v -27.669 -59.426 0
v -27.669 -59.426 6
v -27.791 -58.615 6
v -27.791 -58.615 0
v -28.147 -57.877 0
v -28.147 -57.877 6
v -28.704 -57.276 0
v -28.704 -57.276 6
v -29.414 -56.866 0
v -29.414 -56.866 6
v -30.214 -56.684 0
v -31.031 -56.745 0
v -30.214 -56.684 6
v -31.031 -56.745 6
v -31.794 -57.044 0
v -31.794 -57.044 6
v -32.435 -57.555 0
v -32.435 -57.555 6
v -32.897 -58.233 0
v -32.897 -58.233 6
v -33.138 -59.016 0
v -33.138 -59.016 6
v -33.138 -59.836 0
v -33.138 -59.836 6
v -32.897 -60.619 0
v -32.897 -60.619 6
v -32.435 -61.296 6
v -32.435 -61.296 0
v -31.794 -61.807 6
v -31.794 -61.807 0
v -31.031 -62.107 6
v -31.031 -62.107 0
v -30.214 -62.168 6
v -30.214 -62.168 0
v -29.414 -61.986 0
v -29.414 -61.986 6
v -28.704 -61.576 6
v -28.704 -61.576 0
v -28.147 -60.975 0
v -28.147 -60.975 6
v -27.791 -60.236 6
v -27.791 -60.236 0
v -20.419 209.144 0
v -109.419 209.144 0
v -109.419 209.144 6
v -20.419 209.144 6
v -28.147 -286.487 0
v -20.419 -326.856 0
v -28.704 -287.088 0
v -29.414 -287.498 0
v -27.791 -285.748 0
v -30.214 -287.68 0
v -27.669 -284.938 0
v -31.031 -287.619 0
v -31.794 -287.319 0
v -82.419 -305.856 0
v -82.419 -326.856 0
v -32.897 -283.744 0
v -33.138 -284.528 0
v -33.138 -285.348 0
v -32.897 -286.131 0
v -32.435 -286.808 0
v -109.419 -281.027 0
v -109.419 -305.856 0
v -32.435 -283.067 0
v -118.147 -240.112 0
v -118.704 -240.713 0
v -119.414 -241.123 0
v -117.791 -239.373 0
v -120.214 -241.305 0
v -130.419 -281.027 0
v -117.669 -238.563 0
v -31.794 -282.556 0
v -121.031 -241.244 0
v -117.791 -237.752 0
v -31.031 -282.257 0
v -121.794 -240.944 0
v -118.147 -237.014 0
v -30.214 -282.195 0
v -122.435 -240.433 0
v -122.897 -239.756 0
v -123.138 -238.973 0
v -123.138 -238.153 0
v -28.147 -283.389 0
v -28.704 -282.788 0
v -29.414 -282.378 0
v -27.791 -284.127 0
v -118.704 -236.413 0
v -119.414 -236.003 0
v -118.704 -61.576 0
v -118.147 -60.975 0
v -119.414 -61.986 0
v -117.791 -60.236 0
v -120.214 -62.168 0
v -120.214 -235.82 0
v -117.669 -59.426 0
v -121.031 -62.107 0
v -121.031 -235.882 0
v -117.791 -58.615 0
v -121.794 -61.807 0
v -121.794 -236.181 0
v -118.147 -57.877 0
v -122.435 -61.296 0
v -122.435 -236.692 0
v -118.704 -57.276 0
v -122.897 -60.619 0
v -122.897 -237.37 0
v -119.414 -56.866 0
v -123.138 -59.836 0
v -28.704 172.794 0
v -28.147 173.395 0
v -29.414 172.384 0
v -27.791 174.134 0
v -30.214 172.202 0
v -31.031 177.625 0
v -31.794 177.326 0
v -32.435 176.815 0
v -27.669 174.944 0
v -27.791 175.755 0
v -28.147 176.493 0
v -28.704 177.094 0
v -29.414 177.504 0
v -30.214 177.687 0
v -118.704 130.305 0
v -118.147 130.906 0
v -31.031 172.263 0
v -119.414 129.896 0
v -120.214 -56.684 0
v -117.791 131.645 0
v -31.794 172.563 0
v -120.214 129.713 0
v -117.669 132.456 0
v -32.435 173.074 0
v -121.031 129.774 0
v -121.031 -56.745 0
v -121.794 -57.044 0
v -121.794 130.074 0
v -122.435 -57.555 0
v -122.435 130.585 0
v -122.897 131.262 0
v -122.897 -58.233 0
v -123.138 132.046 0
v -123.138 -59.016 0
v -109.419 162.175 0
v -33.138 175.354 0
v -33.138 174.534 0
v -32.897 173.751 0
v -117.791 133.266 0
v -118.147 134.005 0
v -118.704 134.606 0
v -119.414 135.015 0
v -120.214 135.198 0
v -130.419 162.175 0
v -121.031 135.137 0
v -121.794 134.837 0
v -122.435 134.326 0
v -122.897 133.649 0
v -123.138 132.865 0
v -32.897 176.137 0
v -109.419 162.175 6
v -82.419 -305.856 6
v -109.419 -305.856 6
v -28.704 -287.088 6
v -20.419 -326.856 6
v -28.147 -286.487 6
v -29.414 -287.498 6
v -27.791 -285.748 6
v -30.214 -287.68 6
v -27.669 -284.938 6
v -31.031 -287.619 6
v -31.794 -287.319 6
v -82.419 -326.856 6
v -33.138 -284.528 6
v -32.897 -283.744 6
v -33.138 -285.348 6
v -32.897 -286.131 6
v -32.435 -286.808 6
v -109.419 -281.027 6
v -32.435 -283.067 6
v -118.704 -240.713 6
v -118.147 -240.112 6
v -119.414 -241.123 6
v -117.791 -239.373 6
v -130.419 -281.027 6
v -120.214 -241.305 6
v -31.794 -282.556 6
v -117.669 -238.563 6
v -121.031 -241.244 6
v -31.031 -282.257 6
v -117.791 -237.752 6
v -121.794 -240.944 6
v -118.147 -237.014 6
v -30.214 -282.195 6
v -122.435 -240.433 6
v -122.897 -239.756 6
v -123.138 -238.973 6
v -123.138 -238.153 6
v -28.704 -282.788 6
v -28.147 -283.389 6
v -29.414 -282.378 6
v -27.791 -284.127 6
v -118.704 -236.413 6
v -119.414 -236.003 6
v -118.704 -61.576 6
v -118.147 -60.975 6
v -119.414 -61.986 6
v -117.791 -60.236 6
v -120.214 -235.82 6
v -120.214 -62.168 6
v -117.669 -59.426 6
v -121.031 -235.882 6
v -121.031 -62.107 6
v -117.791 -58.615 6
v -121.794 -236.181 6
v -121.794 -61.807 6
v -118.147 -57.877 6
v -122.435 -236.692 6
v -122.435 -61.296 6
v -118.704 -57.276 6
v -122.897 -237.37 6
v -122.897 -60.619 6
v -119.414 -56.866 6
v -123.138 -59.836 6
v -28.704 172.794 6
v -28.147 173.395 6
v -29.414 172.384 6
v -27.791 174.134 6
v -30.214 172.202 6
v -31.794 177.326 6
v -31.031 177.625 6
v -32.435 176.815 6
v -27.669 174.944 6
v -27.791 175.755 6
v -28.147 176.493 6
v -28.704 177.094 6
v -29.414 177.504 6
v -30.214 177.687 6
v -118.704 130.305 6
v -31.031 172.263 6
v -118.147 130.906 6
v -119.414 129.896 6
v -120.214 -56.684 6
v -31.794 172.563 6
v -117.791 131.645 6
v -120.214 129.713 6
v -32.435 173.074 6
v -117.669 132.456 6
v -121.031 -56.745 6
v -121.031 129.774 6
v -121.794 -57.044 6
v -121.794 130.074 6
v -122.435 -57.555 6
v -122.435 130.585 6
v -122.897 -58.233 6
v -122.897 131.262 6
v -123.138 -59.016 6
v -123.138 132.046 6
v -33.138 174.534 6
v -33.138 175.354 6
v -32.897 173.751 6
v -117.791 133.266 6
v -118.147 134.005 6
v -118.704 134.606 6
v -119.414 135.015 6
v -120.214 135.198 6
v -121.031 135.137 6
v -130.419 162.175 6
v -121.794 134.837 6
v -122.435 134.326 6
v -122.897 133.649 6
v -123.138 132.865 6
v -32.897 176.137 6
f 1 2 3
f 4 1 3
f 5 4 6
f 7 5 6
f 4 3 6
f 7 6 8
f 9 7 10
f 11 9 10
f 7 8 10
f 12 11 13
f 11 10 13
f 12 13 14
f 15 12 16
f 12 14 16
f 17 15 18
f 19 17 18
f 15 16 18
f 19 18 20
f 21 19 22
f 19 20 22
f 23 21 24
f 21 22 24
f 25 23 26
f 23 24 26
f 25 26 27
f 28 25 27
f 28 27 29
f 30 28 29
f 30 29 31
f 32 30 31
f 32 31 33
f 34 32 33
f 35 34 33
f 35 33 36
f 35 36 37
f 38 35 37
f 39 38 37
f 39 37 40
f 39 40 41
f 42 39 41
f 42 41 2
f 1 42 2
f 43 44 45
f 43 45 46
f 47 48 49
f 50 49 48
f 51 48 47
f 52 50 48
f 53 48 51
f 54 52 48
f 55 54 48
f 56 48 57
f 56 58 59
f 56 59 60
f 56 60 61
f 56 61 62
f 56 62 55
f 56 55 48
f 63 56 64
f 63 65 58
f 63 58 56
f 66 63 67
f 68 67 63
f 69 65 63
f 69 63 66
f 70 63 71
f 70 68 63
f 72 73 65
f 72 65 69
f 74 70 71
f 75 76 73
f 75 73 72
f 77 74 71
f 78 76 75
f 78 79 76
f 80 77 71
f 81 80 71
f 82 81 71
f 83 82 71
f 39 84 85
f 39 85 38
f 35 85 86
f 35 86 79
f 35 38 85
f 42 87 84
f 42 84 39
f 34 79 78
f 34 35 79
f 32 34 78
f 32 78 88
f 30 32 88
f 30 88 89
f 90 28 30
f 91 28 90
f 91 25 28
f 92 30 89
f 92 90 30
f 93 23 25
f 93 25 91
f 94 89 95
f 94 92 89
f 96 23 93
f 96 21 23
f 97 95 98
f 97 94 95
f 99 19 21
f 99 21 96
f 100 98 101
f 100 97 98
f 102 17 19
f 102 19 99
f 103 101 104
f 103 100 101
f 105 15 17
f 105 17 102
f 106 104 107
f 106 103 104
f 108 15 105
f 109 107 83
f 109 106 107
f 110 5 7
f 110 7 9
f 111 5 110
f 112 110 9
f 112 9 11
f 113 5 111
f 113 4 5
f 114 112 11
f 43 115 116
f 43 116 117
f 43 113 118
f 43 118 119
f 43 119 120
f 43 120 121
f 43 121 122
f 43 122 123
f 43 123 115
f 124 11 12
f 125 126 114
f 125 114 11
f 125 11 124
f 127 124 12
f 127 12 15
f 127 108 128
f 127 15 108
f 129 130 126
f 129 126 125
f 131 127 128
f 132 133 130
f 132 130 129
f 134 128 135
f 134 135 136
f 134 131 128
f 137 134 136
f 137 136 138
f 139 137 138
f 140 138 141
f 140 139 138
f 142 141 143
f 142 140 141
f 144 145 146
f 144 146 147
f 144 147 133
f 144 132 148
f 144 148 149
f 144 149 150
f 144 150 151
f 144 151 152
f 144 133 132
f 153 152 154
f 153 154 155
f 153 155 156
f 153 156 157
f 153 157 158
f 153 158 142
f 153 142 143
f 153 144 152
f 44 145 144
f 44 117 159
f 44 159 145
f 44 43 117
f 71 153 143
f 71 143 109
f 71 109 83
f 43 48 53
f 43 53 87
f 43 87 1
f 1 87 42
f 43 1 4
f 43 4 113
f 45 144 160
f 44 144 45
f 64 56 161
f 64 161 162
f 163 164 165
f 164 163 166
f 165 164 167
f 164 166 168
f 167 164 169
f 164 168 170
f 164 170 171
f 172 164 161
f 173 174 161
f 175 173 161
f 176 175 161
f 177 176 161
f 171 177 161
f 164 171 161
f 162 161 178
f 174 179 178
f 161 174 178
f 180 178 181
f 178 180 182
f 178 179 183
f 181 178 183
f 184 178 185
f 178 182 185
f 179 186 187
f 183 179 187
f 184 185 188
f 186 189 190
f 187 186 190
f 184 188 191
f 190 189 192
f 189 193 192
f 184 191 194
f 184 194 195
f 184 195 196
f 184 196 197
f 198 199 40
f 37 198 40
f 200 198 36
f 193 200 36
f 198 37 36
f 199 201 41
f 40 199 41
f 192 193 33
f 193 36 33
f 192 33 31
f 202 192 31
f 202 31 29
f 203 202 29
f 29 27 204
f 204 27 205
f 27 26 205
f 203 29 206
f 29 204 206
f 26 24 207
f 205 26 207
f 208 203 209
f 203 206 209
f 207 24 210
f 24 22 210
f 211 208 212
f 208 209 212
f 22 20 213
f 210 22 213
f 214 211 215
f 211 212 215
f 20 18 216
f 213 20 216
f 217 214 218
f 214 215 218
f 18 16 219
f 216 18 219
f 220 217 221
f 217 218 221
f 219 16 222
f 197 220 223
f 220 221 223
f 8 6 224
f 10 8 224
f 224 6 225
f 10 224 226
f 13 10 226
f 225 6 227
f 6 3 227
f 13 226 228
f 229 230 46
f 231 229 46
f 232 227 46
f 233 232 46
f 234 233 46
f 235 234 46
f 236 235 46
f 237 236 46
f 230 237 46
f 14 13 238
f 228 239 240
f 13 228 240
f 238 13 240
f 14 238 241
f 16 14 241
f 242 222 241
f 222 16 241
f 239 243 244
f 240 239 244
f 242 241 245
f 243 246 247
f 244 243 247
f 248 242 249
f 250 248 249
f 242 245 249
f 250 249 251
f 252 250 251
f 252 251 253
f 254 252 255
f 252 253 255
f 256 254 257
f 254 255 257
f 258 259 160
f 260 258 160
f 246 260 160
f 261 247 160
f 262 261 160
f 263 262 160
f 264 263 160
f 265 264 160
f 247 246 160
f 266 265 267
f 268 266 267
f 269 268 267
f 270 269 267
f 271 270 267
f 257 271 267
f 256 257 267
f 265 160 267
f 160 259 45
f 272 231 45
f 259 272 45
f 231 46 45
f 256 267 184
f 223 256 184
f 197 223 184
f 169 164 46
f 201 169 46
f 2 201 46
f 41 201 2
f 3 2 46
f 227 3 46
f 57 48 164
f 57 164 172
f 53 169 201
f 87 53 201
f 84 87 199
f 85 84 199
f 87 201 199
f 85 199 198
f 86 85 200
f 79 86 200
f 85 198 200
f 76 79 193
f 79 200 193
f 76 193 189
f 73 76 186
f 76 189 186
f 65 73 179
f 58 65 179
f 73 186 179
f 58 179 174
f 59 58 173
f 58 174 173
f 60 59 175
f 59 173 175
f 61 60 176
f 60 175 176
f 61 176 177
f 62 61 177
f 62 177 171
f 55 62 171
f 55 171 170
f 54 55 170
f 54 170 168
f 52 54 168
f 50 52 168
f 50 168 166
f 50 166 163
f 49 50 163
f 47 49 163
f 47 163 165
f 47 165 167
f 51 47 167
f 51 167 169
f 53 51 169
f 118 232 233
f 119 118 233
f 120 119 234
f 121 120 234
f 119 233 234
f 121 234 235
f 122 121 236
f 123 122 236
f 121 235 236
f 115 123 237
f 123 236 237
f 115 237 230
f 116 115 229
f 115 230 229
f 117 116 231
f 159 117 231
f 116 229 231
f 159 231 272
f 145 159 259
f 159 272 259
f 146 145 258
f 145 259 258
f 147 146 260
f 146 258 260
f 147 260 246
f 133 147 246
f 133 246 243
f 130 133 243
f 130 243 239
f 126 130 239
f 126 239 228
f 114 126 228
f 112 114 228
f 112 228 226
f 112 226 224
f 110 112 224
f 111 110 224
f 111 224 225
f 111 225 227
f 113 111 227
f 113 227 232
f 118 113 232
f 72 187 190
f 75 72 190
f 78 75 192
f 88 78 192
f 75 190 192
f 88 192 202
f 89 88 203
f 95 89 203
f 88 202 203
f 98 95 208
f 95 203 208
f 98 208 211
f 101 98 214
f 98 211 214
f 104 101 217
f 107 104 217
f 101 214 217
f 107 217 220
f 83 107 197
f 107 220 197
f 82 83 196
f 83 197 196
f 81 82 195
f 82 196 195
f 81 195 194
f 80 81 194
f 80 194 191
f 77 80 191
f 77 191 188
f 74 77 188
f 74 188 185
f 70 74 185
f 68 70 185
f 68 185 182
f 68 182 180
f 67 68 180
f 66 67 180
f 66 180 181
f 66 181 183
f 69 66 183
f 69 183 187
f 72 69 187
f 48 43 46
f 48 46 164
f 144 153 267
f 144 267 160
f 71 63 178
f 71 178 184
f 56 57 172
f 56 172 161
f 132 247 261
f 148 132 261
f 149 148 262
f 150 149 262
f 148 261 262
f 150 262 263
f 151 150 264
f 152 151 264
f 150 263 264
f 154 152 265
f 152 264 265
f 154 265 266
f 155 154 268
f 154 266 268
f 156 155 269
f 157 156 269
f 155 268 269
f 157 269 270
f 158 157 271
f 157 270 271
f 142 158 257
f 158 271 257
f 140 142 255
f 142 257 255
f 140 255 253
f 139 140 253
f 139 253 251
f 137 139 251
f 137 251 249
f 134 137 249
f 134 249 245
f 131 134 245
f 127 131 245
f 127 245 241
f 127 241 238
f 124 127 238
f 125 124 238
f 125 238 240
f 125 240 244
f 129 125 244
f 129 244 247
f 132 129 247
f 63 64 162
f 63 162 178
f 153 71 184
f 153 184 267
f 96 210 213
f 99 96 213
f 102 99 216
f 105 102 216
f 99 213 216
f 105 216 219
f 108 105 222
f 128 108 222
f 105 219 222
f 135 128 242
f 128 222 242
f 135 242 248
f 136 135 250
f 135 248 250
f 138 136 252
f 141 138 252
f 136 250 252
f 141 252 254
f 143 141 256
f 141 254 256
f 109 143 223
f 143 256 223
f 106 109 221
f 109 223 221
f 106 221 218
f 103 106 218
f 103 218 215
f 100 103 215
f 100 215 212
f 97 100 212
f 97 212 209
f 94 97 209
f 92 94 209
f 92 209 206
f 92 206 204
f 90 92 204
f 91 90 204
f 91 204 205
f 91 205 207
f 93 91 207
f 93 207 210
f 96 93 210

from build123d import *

# Parameters (mm, degrees)
BOSS_EXTRUDE1_DEPTH = 6
SKETCH2_R           = 2.75
CUT_EXTRUDE1_DEPTH  = 10


with BuildPart() as part:
    # Sketch1 → Boss-Extrude1 (new body)
    with BuildSketch(Plane.XY):
        Polygon((-82.419020993, -326.855738356), (-82.419020993, -305.855738356), (-109.419020993, -305.855738356), (-109.419020993, -281.0269235), (-130.419020993, -281.0269235), (-130.419020993, 162.175301007), (-109.419020993, 162.175301007), (-109.419020993, 209.144261644), (-20.419020993, 209.144261644), (-20.419020993, -326.855738356), align=None)
    extrude(amount=BOSS_EXTRUDE1_DEPTH)

    # Sketch2 → Cut-Extrude1 (cut)
    with BuildSketch(Plane.XY.offset(6)):
        with Locations((-120.419020993, -59.425811246)):
            Circle(SKETCH2_R)
        with Locations((-30.419020993, -59.425811246)):
            Circle(SKETCH2_R)
        with Locations((-30.419020993, 174.944215352)):
            Circle(SKETCH2_R)
        with Locations((-30.419020993, -284.937648356)):
            Circle(SKETCH2_R)
        with Locations((-120.419020993, -238.562803654)):
            Circle(SKETCH2_R)
        with Locations((-120.419020993, 132.455525643)):
            Circle(SKETCH2_R)
    extrude(amount=-CUT_EXTRUDE1_DEPTH, mode=Mode.SUBTRACT)


solid = part.part
